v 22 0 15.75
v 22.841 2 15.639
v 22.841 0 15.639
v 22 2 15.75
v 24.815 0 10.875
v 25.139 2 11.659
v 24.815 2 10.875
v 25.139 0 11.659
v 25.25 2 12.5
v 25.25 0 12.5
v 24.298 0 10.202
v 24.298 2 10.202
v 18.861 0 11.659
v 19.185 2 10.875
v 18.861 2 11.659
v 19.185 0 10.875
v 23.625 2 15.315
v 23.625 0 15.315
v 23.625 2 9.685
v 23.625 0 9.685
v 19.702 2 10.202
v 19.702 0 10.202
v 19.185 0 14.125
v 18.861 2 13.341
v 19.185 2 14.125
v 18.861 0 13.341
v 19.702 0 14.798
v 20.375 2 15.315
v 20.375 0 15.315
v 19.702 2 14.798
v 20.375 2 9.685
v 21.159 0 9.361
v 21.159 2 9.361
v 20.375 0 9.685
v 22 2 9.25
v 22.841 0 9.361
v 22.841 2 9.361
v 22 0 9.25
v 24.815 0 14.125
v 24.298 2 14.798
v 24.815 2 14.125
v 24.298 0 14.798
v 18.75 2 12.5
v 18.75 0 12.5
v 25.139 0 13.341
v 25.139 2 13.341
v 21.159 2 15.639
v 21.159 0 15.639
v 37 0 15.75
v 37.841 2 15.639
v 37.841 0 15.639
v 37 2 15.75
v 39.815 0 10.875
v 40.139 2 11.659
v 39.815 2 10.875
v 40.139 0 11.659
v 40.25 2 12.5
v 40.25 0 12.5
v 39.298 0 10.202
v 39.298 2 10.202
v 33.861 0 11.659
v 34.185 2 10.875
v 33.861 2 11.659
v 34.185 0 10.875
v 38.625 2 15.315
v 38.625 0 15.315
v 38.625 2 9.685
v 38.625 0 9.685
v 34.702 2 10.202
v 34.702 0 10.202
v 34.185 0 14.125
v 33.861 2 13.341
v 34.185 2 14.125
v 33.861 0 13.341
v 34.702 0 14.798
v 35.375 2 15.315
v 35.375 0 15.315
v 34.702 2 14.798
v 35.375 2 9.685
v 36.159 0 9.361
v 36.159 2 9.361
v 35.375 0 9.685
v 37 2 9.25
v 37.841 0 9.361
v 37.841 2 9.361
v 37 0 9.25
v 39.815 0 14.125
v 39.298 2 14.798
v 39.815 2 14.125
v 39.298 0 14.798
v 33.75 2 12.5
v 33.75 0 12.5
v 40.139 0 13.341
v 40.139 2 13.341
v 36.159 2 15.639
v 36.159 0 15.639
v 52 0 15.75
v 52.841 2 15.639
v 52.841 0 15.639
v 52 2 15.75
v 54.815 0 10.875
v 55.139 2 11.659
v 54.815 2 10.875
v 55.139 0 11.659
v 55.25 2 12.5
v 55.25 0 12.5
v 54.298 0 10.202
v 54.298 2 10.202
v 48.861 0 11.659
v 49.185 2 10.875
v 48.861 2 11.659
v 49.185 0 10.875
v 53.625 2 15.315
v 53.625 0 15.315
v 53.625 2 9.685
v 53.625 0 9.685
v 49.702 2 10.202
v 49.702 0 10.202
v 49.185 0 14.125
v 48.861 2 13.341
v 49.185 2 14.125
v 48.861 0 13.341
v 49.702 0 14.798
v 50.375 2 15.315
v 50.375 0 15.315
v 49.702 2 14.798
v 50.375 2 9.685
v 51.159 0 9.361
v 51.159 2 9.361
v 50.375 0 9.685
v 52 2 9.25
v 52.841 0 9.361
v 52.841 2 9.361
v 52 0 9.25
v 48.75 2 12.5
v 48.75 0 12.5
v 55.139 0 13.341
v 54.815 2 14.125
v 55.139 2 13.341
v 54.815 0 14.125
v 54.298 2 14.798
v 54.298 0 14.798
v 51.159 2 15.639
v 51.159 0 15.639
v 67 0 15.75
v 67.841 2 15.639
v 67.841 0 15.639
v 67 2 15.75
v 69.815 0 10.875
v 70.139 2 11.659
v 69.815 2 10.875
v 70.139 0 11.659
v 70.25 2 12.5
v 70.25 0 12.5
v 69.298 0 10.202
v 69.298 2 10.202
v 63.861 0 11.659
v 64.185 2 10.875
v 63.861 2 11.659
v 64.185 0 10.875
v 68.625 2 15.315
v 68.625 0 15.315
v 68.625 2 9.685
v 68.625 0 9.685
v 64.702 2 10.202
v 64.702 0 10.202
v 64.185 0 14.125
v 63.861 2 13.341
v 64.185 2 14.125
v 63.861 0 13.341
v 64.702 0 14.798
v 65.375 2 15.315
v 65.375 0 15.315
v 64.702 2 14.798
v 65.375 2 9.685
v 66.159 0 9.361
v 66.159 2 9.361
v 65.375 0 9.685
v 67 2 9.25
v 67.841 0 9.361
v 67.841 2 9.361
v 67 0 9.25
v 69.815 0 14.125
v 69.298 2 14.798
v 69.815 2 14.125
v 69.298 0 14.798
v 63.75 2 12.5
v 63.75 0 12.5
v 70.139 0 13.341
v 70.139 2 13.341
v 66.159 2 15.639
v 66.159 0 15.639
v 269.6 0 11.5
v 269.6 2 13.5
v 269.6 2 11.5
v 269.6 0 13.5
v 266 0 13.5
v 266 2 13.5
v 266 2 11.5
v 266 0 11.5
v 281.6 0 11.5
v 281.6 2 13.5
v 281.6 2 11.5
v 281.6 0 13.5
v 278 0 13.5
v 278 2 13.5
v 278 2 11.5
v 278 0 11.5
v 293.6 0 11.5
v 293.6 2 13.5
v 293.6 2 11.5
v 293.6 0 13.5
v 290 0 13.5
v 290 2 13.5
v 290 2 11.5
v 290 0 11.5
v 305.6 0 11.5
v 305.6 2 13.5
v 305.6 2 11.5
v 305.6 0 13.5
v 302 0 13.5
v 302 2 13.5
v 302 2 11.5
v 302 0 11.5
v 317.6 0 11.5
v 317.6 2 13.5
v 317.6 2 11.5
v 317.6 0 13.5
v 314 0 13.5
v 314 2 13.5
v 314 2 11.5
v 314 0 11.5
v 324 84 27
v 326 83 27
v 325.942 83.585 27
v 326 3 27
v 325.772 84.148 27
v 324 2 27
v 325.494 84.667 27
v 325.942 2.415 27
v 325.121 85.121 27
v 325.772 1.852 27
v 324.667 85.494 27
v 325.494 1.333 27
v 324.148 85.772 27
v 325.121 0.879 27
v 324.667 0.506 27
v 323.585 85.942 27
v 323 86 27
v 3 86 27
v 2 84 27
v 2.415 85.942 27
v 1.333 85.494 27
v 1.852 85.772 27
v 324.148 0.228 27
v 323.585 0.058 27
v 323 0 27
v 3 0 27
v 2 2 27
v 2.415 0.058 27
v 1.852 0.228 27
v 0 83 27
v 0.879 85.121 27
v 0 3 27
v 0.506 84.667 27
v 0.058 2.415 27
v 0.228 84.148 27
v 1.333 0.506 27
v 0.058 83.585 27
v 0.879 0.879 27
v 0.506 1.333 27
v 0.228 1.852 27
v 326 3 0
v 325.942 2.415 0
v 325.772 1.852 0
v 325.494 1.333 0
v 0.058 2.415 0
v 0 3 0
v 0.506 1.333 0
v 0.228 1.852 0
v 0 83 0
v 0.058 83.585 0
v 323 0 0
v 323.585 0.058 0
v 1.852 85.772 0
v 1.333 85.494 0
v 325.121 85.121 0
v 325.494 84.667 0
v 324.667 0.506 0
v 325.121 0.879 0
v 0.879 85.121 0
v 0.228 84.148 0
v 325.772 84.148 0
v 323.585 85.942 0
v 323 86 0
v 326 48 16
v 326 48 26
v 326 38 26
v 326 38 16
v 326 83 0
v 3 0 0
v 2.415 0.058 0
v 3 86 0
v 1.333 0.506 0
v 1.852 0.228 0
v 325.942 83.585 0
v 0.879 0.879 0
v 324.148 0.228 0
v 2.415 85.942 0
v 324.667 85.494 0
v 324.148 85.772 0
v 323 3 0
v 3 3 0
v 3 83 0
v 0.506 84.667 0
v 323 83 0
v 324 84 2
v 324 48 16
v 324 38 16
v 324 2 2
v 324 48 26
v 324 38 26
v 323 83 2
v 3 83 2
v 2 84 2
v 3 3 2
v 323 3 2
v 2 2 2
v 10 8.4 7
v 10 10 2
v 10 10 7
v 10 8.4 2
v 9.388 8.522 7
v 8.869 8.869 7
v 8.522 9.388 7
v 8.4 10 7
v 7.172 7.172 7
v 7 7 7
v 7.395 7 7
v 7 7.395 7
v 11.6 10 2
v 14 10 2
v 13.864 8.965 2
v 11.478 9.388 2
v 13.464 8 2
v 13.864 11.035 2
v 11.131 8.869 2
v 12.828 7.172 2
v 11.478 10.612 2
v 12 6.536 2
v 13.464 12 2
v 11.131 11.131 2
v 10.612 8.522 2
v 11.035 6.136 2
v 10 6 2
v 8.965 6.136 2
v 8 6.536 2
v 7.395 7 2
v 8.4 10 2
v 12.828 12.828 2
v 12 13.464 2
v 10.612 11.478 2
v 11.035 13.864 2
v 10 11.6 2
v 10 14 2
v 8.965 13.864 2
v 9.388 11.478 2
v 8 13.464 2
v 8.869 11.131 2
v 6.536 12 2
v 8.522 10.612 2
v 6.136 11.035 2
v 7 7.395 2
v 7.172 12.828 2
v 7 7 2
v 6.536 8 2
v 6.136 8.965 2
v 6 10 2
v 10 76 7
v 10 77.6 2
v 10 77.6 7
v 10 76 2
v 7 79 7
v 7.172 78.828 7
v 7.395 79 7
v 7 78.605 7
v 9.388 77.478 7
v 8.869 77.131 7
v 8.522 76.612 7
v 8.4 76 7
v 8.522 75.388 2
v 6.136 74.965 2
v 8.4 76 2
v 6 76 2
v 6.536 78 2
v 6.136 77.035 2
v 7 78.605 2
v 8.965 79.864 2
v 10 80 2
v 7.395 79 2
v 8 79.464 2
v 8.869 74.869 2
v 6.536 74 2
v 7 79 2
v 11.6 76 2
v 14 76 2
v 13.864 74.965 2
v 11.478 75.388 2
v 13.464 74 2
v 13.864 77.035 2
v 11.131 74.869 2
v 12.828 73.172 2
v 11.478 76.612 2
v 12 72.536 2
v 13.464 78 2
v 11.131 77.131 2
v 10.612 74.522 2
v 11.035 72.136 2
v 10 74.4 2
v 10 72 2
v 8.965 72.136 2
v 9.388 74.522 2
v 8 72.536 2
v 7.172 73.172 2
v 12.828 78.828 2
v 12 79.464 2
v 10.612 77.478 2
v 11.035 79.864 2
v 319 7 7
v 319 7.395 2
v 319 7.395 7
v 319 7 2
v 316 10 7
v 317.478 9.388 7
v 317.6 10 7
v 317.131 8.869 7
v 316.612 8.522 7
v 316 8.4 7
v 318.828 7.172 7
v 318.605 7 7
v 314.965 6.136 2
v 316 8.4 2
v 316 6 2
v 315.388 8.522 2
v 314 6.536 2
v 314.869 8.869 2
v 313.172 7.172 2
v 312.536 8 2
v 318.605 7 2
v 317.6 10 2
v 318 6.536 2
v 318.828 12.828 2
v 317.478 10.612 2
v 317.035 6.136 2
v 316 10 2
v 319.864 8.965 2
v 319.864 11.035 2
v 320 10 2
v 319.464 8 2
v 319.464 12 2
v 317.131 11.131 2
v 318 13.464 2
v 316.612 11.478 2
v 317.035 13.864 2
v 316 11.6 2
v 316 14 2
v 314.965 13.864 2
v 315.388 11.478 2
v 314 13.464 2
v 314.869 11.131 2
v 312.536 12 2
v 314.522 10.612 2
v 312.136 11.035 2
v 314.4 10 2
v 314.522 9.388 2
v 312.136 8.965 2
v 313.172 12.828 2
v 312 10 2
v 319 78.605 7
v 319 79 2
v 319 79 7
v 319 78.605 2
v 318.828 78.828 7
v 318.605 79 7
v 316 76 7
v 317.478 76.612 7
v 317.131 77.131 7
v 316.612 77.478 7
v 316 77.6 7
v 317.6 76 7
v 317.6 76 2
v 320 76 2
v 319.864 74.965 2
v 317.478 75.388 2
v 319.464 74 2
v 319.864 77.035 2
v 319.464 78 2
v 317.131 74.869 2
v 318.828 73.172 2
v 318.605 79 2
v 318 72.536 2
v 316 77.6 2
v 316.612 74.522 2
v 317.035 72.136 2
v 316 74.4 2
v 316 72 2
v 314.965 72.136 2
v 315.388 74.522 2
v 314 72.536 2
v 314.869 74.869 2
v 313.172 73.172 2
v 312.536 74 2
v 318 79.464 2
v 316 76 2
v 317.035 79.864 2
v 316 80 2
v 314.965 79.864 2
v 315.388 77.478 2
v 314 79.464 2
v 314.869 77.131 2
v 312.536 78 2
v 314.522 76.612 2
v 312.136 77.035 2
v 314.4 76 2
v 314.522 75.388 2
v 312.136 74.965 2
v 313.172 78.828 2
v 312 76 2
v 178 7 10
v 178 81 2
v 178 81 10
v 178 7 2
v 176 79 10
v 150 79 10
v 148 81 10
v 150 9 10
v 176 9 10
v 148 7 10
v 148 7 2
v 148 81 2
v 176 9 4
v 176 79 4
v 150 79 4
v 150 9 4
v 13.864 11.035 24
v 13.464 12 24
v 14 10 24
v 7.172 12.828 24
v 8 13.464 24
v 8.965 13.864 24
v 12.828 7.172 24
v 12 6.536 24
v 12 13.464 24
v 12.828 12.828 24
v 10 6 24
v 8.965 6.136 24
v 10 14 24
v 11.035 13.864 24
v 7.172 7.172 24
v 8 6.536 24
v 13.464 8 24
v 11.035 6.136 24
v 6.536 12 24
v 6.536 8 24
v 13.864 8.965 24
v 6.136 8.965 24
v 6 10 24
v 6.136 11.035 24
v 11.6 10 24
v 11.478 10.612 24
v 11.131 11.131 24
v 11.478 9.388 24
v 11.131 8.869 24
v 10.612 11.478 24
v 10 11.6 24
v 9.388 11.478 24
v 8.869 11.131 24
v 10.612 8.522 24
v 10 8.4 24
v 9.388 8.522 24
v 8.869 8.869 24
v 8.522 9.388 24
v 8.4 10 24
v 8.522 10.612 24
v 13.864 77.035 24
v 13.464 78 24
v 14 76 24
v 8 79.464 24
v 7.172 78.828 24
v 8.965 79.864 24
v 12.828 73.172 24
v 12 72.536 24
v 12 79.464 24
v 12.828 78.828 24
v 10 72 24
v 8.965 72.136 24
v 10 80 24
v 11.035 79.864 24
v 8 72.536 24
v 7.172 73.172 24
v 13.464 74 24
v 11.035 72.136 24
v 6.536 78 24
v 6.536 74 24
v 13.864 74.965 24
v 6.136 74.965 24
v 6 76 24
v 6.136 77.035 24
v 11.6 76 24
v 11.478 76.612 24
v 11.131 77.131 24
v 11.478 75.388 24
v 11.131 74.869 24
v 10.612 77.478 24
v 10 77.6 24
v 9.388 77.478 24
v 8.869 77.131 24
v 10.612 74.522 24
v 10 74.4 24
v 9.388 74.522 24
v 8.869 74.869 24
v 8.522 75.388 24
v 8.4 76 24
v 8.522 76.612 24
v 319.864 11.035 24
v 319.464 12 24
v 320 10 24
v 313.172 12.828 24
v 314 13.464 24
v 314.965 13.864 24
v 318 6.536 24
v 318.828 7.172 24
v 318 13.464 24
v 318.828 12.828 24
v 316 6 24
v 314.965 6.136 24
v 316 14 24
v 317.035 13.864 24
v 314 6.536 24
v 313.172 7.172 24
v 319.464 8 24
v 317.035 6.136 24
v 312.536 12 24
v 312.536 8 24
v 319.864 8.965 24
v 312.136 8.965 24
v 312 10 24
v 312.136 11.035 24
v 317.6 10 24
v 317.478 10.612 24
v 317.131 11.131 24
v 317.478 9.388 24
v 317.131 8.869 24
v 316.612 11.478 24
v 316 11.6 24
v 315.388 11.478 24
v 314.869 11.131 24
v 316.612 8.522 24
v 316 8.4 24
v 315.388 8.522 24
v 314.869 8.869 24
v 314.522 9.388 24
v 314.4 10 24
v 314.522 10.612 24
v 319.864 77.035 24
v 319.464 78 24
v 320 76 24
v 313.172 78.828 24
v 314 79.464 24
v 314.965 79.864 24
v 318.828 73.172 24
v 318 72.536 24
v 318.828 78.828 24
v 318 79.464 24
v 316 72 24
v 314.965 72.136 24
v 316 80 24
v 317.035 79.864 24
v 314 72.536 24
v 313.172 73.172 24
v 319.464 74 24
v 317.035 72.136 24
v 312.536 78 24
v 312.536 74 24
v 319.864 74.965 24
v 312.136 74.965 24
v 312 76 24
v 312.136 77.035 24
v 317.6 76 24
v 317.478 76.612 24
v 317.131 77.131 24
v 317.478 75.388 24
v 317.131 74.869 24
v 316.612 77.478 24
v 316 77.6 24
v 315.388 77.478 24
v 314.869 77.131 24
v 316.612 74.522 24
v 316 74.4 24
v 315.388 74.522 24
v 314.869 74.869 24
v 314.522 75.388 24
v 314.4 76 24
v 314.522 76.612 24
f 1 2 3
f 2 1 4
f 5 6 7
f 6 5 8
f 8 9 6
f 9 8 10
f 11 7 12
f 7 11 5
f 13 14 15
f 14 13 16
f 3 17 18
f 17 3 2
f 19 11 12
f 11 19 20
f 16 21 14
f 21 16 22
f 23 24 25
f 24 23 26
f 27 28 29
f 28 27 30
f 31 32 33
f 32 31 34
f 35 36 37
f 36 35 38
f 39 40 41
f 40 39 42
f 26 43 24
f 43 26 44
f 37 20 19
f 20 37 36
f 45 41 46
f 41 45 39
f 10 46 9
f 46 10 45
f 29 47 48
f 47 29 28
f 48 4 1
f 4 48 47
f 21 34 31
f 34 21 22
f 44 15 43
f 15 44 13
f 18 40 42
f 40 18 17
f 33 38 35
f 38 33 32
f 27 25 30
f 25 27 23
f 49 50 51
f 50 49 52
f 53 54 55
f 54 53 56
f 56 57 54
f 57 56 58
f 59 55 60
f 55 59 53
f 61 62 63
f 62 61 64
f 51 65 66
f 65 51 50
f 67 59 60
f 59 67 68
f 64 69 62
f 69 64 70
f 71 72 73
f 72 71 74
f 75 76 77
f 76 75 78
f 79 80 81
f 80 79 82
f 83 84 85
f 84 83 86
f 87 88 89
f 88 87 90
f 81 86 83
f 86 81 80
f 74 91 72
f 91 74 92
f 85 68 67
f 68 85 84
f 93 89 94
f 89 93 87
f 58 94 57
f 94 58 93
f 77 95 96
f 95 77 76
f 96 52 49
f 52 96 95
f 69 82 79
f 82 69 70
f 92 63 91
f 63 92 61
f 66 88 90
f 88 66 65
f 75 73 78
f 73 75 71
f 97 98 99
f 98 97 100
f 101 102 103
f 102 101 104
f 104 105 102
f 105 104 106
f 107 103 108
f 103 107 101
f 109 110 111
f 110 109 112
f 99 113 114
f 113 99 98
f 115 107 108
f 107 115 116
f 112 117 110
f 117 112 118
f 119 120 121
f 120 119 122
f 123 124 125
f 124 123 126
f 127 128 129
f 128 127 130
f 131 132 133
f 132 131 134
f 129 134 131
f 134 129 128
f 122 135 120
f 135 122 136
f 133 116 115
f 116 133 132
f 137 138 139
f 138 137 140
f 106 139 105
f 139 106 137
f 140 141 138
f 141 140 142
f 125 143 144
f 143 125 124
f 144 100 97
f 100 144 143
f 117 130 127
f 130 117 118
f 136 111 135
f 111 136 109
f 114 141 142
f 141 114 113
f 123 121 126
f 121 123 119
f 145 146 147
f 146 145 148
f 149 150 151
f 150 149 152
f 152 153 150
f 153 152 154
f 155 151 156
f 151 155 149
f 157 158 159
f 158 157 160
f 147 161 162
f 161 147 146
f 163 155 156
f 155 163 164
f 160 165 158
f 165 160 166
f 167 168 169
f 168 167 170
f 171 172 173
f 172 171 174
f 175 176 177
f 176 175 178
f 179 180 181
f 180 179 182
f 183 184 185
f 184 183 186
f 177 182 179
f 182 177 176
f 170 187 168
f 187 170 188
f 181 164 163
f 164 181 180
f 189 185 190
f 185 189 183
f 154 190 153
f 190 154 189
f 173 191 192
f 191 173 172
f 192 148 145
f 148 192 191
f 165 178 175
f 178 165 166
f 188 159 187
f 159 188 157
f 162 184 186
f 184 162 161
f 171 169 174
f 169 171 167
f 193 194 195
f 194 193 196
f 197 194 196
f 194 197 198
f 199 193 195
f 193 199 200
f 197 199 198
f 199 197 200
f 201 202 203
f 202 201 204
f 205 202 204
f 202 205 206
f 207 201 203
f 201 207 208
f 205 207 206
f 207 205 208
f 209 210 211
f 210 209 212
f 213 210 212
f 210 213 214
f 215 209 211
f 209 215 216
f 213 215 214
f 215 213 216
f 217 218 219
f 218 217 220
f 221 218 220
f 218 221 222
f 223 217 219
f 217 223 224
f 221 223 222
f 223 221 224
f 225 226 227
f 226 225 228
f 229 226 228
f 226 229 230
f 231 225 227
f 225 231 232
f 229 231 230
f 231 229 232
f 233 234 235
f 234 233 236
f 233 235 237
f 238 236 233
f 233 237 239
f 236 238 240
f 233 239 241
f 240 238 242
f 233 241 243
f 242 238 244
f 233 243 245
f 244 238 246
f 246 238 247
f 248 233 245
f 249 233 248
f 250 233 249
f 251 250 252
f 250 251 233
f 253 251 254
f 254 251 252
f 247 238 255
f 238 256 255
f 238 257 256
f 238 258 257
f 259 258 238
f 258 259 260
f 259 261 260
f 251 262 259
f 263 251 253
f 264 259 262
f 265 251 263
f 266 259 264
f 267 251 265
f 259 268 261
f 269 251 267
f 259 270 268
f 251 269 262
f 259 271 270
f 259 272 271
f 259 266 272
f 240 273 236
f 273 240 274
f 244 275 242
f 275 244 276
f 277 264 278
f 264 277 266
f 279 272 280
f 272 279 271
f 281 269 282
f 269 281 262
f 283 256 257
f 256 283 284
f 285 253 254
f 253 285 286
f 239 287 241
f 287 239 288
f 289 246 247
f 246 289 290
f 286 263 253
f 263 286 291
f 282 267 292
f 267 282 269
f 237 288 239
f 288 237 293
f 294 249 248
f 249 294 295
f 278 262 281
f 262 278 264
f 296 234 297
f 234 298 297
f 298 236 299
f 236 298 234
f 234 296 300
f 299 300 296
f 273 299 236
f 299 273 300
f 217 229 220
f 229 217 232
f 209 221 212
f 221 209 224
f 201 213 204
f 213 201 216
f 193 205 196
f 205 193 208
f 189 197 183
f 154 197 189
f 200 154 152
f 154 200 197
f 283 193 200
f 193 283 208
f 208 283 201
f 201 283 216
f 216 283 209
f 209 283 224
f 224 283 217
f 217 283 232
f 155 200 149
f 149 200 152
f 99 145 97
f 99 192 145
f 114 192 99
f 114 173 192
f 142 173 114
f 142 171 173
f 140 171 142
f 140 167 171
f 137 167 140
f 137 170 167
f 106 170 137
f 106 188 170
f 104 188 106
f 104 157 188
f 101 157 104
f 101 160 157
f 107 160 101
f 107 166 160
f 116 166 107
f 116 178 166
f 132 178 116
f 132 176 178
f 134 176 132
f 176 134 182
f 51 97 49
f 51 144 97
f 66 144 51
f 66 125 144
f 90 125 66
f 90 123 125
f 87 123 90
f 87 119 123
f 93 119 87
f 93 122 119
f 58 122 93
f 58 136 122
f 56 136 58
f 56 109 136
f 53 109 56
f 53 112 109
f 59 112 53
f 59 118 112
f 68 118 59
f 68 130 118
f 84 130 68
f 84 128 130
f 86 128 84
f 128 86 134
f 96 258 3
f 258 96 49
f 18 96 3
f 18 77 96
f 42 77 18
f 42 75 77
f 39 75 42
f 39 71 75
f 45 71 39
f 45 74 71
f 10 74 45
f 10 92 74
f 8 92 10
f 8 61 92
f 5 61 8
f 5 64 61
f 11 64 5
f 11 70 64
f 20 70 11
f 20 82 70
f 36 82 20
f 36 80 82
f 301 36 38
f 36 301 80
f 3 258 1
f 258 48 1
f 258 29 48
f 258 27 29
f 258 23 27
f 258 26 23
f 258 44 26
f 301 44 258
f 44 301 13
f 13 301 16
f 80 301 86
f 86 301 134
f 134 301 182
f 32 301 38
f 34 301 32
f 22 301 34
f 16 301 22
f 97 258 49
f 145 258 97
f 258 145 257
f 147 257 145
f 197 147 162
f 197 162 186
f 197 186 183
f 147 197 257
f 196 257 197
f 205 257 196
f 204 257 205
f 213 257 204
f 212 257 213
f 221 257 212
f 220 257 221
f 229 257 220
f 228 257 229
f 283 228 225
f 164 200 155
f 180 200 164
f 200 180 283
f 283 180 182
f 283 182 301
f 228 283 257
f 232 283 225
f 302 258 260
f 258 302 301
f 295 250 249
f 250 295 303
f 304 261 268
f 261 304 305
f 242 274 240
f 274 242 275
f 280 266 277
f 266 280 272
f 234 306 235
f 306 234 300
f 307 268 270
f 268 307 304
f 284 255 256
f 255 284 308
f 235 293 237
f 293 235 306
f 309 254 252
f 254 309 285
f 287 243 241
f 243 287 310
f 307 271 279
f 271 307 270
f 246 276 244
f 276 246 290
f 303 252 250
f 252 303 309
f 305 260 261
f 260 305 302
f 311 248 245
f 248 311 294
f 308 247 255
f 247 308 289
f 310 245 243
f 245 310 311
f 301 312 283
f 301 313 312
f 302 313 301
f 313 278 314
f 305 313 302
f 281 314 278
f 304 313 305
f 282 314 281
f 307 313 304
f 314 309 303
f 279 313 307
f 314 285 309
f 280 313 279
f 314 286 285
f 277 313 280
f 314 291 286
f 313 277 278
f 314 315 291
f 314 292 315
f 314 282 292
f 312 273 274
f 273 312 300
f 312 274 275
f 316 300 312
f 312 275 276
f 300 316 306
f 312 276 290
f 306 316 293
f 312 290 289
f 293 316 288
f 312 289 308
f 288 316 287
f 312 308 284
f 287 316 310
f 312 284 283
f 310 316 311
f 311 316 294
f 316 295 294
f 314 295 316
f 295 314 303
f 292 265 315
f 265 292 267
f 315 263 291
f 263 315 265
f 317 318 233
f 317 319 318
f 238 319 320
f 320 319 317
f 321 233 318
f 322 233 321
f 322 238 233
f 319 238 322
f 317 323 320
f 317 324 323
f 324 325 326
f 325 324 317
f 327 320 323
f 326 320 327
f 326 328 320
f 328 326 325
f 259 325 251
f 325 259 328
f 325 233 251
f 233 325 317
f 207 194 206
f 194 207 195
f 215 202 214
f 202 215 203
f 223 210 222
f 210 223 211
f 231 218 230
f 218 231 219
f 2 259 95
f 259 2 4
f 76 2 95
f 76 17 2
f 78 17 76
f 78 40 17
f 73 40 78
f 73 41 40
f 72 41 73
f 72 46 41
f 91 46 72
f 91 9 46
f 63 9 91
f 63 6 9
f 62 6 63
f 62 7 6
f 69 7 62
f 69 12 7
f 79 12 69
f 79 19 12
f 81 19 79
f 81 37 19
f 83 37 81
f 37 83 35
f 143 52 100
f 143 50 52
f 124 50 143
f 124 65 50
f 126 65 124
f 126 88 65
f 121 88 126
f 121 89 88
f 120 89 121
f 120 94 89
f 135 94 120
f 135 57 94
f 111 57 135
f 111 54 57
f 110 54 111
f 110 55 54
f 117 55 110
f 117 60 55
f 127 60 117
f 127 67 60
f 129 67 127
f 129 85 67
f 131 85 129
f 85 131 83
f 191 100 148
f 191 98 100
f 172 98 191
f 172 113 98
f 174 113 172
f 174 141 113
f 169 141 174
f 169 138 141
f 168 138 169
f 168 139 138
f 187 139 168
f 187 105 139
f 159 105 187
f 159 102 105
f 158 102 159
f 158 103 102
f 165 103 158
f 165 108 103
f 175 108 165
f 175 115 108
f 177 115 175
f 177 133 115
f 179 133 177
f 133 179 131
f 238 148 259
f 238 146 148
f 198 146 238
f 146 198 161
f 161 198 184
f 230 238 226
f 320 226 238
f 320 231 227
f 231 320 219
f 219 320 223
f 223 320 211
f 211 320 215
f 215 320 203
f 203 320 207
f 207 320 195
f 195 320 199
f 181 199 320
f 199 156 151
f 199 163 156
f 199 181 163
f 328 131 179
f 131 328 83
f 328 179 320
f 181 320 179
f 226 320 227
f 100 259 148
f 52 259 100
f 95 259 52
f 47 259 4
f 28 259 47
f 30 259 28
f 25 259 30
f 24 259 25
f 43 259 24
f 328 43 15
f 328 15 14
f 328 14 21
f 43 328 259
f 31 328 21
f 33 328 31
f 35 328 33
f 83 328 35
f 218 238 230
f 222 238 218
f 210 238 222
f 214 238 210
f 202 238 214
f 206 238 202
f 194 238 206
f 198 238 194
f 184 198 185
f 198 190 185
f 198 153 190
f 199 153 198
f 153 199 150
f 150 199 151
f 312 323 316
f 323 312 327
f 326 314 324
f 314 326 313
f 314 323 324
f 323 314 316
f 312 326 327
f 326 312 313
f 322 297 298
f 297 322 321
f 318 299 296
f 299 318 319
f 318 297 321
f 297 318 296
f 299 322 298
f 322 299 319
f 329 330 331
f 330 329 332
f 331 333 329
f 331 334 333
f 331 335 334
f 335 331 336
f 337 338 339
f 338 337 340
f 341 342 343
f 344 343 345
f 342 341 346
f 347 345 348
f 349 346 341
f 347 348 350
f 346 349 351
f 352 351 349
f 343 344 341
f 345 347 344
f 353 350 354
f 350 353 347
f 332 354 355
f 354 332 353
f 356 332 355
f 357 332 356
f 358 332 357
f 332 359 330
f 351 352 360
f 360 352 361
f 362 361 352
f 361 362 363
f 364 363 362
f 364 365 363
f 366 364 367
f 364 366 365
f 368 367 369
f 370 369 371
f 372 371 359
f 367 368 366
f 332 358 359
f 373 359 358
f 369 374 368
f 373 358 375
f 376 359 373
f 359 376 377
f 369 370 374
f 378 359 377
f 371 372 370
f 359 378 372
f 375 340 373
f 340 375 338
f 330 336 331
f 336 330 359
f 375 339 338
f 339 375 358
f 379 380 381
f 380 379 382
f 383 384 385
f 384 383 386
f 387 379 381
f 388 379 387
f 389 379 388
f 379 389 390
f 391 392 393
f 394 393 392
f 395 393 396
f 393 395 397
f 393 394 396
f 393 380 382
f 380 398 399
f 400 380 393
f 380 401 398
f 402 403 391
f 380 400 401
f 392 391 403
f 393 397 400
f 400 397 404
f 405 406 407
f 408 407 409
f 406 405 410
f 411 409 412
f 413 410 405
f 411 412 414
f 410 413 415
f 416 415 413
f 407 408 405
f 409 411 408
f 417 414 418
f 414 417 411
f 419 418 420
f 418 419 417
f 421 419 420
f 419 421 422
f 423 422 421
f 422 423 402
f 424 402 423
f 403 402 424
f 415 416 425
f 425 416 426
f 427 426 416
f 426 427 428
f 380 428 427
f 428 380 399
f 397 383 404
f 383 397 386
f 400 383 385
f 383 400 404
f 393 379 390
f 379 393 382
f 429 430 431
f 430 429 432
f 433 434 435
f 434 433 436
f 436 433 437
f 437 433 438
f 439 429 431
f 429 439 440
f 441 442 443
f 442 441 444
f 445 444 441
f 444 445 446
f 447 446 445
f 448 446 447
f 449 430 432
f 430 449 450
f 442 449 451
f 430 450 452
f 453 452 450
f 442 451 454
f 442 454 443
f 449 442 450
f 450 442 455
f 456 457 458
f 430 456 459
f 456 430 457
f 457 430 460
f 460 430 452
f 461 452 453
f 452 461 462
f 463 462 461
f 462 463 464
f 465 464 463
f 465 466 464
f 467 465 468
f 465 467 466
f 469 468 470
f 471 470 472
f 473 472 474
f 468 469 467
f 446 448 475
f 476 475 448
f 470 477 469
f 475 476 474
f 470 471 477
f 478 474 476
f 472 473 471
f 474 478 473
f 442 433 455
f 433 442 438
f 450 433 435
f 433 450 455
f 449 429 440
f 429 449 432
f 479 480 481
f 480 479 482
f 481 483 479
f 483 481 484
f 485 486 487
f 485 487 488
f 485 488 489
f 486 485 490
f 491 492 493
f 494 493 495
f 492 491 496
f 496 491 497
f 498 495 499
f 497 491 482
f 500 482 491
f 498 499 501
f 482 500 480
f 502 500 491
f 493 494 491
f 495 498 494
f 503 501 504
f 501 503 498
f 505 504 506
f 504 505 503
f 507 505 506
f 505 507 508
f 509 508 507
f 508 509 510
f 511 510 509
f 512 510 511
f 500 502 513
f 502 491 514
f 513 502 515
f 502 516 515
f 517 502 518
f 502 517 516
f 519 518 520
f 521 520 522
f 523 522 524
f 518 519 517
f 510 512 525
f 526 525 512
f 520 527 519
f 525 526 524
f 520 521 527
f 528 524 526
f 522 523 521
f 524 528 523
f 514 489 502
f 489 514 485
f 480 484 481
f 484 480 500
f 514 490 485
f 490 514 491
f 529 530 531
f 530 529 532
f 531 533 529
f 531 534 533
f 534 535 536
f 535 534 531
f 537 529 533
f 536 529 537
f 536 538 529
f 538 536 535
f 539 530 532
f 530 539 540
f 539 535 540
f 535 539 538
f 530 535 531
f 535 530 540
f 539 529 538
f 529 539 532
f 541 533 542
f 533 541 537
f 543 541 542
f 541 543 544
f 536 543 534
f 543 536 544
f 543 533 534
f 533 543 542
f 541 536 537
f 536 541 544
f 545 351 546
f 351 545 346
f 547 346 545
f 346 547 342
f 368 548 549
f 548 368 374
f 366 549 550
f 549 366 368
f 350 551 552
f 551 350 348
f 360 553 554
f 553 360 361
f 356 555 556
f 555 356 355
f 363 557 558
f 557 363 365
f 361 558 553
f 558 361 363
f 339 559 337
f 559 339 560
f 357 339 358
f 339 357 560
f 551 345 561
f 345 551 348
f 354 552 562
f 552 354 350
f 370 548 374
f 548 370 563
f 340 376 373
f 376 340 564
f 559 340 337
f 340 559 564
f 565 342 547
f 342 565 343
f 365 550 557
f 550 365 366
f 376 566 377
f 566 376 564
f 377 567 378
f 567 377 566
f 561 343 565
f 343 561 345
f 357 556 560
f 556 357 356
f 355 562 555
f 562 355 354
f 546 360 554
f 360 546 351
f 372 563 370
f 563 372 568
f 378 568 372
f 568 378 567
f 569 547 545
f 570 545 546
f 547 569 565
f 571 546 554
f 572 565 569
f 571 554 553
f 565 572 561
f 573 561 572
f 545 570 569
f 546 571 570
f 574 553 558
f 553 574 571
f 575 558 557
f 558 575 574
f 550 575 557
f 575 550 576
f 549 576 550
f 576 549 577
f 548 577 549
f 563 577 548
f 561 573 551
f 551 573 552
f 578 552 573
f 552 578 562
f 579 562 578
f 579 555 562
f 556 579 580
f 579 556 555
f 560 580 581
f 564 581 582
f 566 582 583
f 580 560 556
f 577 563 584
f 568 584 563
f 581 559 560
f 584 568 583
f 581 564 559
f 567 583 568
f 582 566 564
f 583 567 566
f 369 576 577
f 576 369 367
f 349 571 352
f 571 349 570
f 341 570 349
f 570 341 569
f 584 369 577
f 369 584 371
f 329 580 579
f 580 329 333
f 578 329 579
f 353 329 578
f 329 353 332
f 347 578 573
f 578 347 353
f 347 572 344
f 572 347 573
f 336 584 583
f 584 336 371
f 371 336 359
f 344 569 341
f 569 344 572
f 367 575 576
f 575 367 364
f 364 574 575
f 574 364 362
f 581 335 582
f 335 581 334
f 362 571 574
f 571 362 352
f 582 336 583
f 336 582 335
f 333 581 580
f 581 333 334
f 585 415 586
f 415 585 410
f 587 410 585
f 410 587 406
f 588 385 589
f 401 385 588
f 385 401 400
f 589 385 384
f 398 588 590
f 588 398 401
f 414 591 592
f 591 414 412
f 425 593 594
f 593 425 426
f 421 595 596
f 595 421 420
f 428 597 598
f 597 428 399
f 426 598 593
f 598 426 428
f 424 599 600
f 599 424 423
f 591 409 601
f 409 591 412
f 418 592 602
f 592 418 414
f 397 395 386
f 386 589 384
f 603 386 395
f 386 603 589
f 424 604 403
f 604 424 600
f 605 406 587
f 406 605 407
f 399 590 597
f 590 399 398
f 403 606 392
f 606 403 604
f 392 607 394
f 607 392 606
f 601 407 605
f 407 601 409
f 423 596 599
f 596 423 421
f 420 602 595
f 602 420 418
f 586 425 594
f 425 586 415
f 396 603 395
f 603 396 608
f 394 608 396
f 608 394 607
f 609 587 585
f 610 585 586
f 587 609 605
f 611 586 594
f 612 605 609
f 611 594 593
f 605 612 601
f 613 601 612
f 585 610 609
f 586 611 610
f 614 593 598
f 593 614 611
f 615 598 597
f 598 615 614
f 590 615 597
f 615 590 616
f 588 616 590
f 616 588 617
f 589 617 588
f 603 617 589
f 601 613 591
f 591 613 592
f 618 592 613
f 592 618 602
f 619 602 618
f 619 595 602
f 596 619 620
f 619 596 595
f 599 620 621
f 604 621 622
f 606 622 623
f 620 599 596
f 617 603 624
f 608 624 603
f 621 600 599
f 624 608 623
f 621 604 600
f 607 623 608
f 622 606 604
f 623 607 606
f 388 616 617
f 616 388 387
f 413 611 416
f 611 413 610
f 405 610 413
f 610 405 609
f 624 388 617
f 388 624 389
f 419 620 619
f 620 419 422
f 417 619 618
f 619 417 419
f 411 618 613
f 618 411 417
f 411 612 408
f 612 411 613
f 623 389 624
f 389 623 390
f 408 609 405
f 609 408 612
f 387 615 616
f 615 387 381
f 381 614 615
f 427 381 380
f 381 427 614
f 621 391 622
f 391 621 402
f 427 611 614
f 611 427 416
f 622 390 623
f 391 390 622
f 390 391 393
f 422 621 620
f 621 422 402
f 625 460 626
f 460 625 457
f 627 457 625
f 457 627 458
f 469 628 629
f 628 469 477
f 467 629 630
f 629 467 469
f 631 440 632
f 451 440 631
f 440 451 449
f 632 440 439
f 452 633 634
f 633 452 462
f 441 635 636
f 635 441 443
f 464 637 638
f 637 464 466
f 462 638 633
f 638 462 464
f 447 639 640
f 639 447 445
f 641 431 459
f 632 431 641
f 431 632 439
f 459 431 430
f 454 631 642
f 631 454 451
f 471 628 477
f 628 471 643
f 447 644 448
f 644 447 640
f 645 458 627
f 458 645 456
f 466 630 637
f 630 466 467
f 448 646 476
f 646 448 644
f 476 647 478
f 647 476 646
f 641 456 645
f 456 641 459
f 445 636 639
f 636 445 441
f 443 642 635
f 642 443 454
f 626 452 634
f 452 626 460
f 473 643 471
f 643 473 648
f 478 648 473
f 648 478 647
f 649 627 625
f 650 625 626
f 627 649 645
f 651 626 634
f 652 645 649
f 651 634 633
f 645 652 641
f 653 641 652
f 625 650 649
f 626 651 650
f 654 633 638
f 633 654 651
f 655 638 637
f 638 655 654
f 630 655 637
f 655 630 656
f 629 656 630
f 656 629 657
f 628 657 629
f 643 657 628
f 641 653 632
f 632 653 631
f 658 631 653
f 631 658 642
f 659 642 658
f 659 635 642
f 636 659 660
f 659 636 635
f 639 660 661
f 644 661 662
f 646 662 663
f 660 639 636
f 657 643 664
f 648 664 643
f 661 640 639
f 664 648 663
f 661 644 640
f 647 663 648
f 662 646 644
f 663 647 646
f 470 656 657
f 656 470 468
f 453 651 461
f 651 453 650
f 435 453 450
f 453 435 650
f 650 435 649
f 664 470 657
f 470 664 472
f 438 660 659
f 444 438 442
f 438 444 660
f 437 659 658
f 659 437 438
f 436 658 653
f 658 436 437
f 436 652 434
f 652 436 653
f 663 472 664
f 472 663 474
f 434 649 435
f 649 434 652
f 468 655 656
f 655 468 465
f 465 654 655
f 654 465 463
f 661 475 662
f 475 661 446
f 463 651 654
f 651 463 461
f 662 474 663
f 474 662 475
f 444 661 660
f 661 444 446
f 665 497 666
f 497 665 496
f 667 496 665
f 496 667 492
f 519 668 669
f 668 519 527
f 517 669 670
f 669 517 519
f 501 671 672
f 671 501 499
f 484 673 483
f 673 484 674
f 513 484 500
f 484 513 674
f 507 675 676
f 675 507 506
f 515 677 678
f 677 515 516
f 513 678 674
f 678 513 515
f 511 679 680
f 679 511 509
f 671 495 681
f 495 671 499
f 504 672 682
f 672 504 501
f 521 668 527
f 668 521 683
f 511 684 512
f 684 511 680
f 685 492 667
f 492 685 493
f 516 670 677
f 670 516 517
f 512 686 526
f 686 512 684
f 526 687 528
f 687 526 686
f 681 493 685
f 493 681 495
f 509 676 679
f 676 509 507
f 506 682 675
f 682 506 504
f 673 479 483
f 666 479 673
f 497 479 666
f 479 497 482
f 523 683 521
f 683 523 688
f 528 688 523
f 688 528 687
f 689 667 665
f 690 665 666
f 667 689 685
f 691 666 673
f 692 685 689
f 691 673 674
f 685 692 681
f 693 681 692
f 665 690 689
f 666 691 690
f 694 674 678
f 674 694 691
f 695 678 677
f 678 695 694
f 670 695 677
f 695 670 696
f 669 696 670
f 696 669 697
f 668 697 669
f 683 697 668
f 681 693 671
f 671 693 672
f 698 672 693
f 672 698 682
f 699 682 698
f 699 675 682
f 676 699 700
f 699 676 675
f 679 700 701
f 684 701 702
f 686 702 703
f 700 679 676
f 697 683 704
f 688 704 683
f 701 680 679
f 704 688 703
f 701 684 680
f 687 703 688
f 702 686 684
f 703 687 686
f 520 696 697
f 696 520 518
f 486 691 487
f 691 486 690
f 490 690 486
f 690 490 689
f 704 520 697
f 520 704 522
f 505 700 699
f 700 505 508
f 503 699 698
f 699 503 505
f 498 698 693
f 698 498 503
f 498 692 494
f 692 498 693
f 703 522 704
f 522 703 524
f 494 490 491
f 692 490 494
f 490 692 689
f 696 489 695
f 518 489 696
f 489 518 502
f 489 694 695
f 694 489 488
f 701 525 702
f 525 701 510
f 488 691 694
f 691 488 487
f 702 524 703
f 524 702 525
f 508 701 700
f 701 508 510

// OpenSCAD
// ═══════════════════════════════════════════════════════════════════════════
// Svitrix DIY Enclosure - Parametric Design
// Para matriz WS2812B 32×8 + ESP32-S3-DevKitC-1
//
// Autor: XE1E
// Versión: 1.0
// Fecha: 2026-06-05
//
// Uso:
//   1. Ajustar parámetros según tu panel LED
//   2. Renderizar (F6) y exportar STL
//   3. Imprimir base y tapa por separado
// ═══════════════════════════════════════════════════════════════════════════

// ─── PARÁMETROS DEL PANEL LED ───
// Cambiar estos valores según tu panel:
//   - Pitch 10mm (estándar): panel 320×80mm
//   - Pitch 8mm (rígido):    panel 256×64mm
//   - Pitch 5mm (mini):      panel 160×40mm

led_pitch      = 10;        // mm entre LEDs (5, 8, o 10)
led_cols       = 32;        // columnas
led_rows       = 8;         // filas
panel_thick    = 2;         // grosor del PCB del panel

// Dimensiones calculadas del panel
panel_width    = led_pitch * led_cols;  // 320mm para pitch 10
panel_height   = led_pitch * led_rows;  // 80mm para pitch 10

// ─── PARÁMETROS DEL GABINETE ───
wall           = 2;         // grosor de pared
clearance      = 1;         // holgura alrededor del panel
depth          = 25;        // profundidad total interna
corner_r       = 3;         // radio de esquinas redondeadas

// Dimensiones calculadas del gabinete
inner_w        = panel_width + clearance * 2;
inner_h        = panel_height + clearance * 2;
outer_w        = inner_w + wall * 2;
outer_h        = inner_h + wall * 2;
outer_d        = depth + wall;

// ─── PARÁMETROS DE COMPONENTES ───
// DevKitC-1
devkit_w       = 26;        // ancho DevKitC-1
devkit_l       = 70;        // largo DevKitC-1

// Puerto USB-C
usb_w          = 10;        // ancho apertura USB-C
usb_h          = 4;         // alto apertura USB-C

// Botones
btn_d          = 6.5;       // diámetro agujero botón (6mm + holgura)
btn_spacing    = 15;        // espacio entre centros de botones
btn_count      = 4;         // número de botones

// Sensores
ldr_d          = 5;         // diámetro agujero LDR

// Ventilación
vent_w         = 30;        // ancho total zona ventilación
vent_h         = 2;         // alto ranura ventilación
vent_count     = 5;         // número de ranuras

// ─── PARÁMETROS DE MONTAJE ───
screw_d        = 3.2;       // diámetro tornillo M3
screw_head_d   = 6;         // diámetro cabeza tornillo
screw_depth    = 8;         // profundidad del inserto/tuerca

// ═══════════════════════════════════════════════════════════════════════════
// MÓDULOS AUXILIARES
// ═══════════════════════════════════════════════════════════════════════════

module rounded_box(w, h, d, r) {
    // Caja con esquinas redondeadas
    hull() {
        for (x = [r, w - r])
            for (y = [r, h - r])
                translate([x, y, 0])
                    cylinder(r = r, h = d, $fn = 32);
    }
}

module screw_post(d, h, screw_d) {
    // Poste para tornillo
    difference() {
        cylinder(d = d, h = h, $fn = 24);
        translate([0, 0, -0.1])
            cylinder(d = screw_d, h = h + 0.2, $fn = 16);
    }
}

// ═══════════════════════════════════════════════════════════════════════════
// BASE DEL GABINETE
// ═══════════════════════════════════════════════════════════════════════════

module enclosure_bottom() {
    difference() {
        // Caja exterior con esquinas redondeadas
        rounded_box(outer_w, outer_h, outer_d, corner_r);

        // ─── Cavidad interior ───
        translate([wall, wall, wall])
            cube([inner_w, inner_h, depth + 1]);

        // ─── Ventana para LEDs (frente) ───
        translate([wall + clearance, wall + clearance, -1])
            cube([panel_width, panel_height, wall + 2]);

        // ─── Puerto USB-C (lateral derecho) ───
        translate([outer_w - wall - 1, outer_h/2 - usb_w/2, depth - usb_h - 5])
            cube([wall + 2, usb_w, usb_h + 6]);

        // ─── Agujeros para botones (trasero) ───
        for (i = [0 : btn_count - 1]) {
            translate([wall + 20 + i * btn_spacing, -1, depth/2])
                rotate([-90, 0, 0])
                    cylinder(d = btn_d, h = wall + 2, $fn = 24);
        }

        // ─── Agujero LDR (superior, cerca del frente) ───
        translate([wall + 15, outer_h/2, outer_d - wall - 1])
            cylinder(d = ldr_d, h = wall + 2, $fn = 24);

        // ─── Ranuras de ventilación (trasero) ───
        for (i = [0 : vent_count - 1]) {
            translate([outer_w - 60 + i * 12, -1, depth/2 - vent_h/2])
                cube([vent_w / vent_count * 0.6, wall + 2, vent_h]);
        }

        // ─── Ranuras de ventilación (inferior) ───
        vent_bottom_count = floor((outer_w - 80) / 45);
        for (i = [0 : vent_bottom_count]) {
            translate([40 + i * 45, wall + 10, -1])
                cube([30, 3, wall + 2]);
        }

        // ─── Agujeros para tornillos de tapa (esquinas) ───
        for (x = [wall + 8, outer_w - wall - 8])
            for (y = [wall + 8, outer_h - wall - 8])
                translate([x, y, outer_d - screw_depth])
                    cylinder(d = screw_d, h = screw_depth + 1, $fn = 16);
    }

    // ─── Soportes para panel LED (4 esquinas) ───
    support_h = 5;
    for (x = [wall + 5, outer_w - wall - 8])
        for (y = [wall + 5, outer_h - wall - 8])
            translate([x, y, wall])
                cube([3, 3, support_h]);

    // ─── Soporte/carril para DevKit ───
    devkit_x = outer_w/2 - devkit_w/2 - 2;
    devkit_y = wall + panel_height/2 - devkit_l/2;
    translate([devkit_x, devkit_y, wall])
        difference() {
            cube([devkit_w + 4, devkit_l + 4, 8]);
            translate([2, 2, 2])
                cube([devkit_w, devkit_l, 10]);
        }

    // ─── Postes para tornillos ───
    post_d = 8;
    post_h = depth - 3;
    for (x = [wall + 8, outer_w - wall - 8])
        for (y = [wall + 8, outer_h - wall - 8])
            translate([x, y, wall])
                screw_post(post_d, post_h, screw_d);
}

// ═══════════════════════════════════════════════════════════════════════════
// TAPA DEL GABINETE
// ═══════════════════════════════════════════════════════════════════════════

module enclosure_top() {
    lip_h = 3;      // altura del labio de encaje
    lip_clearance = 0.3;

    difference() {
        union() {
            // Tapa principal
            rounded_box(outer_w, outer_h, wall, corner_r);

            // Labio de encaje (va dentro de la base)
            translate([wall + lip_clearance, wall + lip_clearance, wall])
                cube([inner_w - lip_clearance*2, inner_h - lip_clearance*2, lip_h]);
        }

        // ─── Ventana para difusor ───
        // Dejamos marco de 2mm para soporte del difusor
        translate([wall + clearance + 2, wall + clearance + 2, -1])
            cube([panel_width - 4, panel_height - 4, wall + 2]);

        // ─── Rebaje para difusor (opcional) ───
        // translate([wall + clearance, wall + clearance, wall - 1.5])
        //     cube([panel_width, panel_height, 1.5]);

        // ─── Agujeros para tornillos ───
        for (x = [wall + 8, outer_w - wall - 8])
            for (y = [wall + 8, outer_h - wall - 8])
                translate([x, y, -1]) {
                    // Agujero pasante
                    cylinder(d = screw_d, h = wall + lip_h + 2, $fn = 16);
                    // Avellanado para cabeza
                    cylinder(d = screw_head_d, h = 2, $fn = 24);
                }
    }
}

// ═══════════════════════════════════════════════════════════════════════════
// DIFUSOR (OPCIONAL)
// ═══════════════════════════════════════════════════════════════════════════

module diffuser() {
    // Lámina difusora que encaja en la tapa
    // Imprimir en PLA blanco o usar acrílico opalino
    diffuser_thick = 1.5;

    translate([wall + clearance, wall + clearance, 0])
        cube([panel_width, panel_height, diffuser_thick]);
}

// ═══════════════════════════════════════════════════════════════════════════
// RENDER - DESCOMENTAR LA PIEZA DESEADA
// ═══════════════════════════════════════════════════════════════════════════

// ─── Opción 1: Ver base sola ───
enclosure_bottom();

// ─── Opción 2: Ver tapa sola (para exportar STL) ───
// enclosure_top();

// ─── Opción 3: Ver tapa desplazada (para visualizar conjunto) ───
// translate([0, outer_h + 20, 0])
//     enclosure_top();

// ─── Opción 4: Ver ensamblaje completo ───
// enclosure_bottom();
// translate([0, 0, outer_d + 5])
//     enclosure_top();

// ─── Opción 5: Difusor solo ───
// diffuser();

// ═══════════════════════════════════════════════════════════════════════════
// INFORMACIÓN DE IMPRESIÓN
// ═══════════════════════════════════════════════════════════════════════════
//
// CONFIGURACIÓN RECOMENDADA:
// - Material: PLA o PETG
// - Altura de capa: 0.2mm
// - Perímetros: 3
// - Relleno: 20% (Grid o Gyroid)
// - Soportes: No necesarios
// - Brim: 5mm recomendado para piezas grandes
//
// TEMPERATURAS:
// - PLA: Hotend 200-210°C, Cama 60°C
// - PETG: Hotend 230-245°C, Cama 80°C
//
// ORIENTACIÓN:
// - Base: Imprimir con la ventana de LEDs hacia arriba
// - Tapa: Imprimir con la cara exterior hacia abajo (superficie lisa)
//
// TIEMPO ESTIMADO (200mm/s):
// - Base: 4-6 horas
// - Tapa: 1-2 horas
//
// FILAMENTO ESTIMADO:
// - Base: 60-80g
// - Tapa: 20-30g
// - Total: ~100g
//
// POST-PROCESADO:
// - Limpiar rebabas de los agujeros
// - Verificar que los tornillos M3 entren suavemente
// - Opcional: Lijar cara exterior de tapa para mejor acabado
//
// ═══════════════════════════════════════════════════════════════════════════
